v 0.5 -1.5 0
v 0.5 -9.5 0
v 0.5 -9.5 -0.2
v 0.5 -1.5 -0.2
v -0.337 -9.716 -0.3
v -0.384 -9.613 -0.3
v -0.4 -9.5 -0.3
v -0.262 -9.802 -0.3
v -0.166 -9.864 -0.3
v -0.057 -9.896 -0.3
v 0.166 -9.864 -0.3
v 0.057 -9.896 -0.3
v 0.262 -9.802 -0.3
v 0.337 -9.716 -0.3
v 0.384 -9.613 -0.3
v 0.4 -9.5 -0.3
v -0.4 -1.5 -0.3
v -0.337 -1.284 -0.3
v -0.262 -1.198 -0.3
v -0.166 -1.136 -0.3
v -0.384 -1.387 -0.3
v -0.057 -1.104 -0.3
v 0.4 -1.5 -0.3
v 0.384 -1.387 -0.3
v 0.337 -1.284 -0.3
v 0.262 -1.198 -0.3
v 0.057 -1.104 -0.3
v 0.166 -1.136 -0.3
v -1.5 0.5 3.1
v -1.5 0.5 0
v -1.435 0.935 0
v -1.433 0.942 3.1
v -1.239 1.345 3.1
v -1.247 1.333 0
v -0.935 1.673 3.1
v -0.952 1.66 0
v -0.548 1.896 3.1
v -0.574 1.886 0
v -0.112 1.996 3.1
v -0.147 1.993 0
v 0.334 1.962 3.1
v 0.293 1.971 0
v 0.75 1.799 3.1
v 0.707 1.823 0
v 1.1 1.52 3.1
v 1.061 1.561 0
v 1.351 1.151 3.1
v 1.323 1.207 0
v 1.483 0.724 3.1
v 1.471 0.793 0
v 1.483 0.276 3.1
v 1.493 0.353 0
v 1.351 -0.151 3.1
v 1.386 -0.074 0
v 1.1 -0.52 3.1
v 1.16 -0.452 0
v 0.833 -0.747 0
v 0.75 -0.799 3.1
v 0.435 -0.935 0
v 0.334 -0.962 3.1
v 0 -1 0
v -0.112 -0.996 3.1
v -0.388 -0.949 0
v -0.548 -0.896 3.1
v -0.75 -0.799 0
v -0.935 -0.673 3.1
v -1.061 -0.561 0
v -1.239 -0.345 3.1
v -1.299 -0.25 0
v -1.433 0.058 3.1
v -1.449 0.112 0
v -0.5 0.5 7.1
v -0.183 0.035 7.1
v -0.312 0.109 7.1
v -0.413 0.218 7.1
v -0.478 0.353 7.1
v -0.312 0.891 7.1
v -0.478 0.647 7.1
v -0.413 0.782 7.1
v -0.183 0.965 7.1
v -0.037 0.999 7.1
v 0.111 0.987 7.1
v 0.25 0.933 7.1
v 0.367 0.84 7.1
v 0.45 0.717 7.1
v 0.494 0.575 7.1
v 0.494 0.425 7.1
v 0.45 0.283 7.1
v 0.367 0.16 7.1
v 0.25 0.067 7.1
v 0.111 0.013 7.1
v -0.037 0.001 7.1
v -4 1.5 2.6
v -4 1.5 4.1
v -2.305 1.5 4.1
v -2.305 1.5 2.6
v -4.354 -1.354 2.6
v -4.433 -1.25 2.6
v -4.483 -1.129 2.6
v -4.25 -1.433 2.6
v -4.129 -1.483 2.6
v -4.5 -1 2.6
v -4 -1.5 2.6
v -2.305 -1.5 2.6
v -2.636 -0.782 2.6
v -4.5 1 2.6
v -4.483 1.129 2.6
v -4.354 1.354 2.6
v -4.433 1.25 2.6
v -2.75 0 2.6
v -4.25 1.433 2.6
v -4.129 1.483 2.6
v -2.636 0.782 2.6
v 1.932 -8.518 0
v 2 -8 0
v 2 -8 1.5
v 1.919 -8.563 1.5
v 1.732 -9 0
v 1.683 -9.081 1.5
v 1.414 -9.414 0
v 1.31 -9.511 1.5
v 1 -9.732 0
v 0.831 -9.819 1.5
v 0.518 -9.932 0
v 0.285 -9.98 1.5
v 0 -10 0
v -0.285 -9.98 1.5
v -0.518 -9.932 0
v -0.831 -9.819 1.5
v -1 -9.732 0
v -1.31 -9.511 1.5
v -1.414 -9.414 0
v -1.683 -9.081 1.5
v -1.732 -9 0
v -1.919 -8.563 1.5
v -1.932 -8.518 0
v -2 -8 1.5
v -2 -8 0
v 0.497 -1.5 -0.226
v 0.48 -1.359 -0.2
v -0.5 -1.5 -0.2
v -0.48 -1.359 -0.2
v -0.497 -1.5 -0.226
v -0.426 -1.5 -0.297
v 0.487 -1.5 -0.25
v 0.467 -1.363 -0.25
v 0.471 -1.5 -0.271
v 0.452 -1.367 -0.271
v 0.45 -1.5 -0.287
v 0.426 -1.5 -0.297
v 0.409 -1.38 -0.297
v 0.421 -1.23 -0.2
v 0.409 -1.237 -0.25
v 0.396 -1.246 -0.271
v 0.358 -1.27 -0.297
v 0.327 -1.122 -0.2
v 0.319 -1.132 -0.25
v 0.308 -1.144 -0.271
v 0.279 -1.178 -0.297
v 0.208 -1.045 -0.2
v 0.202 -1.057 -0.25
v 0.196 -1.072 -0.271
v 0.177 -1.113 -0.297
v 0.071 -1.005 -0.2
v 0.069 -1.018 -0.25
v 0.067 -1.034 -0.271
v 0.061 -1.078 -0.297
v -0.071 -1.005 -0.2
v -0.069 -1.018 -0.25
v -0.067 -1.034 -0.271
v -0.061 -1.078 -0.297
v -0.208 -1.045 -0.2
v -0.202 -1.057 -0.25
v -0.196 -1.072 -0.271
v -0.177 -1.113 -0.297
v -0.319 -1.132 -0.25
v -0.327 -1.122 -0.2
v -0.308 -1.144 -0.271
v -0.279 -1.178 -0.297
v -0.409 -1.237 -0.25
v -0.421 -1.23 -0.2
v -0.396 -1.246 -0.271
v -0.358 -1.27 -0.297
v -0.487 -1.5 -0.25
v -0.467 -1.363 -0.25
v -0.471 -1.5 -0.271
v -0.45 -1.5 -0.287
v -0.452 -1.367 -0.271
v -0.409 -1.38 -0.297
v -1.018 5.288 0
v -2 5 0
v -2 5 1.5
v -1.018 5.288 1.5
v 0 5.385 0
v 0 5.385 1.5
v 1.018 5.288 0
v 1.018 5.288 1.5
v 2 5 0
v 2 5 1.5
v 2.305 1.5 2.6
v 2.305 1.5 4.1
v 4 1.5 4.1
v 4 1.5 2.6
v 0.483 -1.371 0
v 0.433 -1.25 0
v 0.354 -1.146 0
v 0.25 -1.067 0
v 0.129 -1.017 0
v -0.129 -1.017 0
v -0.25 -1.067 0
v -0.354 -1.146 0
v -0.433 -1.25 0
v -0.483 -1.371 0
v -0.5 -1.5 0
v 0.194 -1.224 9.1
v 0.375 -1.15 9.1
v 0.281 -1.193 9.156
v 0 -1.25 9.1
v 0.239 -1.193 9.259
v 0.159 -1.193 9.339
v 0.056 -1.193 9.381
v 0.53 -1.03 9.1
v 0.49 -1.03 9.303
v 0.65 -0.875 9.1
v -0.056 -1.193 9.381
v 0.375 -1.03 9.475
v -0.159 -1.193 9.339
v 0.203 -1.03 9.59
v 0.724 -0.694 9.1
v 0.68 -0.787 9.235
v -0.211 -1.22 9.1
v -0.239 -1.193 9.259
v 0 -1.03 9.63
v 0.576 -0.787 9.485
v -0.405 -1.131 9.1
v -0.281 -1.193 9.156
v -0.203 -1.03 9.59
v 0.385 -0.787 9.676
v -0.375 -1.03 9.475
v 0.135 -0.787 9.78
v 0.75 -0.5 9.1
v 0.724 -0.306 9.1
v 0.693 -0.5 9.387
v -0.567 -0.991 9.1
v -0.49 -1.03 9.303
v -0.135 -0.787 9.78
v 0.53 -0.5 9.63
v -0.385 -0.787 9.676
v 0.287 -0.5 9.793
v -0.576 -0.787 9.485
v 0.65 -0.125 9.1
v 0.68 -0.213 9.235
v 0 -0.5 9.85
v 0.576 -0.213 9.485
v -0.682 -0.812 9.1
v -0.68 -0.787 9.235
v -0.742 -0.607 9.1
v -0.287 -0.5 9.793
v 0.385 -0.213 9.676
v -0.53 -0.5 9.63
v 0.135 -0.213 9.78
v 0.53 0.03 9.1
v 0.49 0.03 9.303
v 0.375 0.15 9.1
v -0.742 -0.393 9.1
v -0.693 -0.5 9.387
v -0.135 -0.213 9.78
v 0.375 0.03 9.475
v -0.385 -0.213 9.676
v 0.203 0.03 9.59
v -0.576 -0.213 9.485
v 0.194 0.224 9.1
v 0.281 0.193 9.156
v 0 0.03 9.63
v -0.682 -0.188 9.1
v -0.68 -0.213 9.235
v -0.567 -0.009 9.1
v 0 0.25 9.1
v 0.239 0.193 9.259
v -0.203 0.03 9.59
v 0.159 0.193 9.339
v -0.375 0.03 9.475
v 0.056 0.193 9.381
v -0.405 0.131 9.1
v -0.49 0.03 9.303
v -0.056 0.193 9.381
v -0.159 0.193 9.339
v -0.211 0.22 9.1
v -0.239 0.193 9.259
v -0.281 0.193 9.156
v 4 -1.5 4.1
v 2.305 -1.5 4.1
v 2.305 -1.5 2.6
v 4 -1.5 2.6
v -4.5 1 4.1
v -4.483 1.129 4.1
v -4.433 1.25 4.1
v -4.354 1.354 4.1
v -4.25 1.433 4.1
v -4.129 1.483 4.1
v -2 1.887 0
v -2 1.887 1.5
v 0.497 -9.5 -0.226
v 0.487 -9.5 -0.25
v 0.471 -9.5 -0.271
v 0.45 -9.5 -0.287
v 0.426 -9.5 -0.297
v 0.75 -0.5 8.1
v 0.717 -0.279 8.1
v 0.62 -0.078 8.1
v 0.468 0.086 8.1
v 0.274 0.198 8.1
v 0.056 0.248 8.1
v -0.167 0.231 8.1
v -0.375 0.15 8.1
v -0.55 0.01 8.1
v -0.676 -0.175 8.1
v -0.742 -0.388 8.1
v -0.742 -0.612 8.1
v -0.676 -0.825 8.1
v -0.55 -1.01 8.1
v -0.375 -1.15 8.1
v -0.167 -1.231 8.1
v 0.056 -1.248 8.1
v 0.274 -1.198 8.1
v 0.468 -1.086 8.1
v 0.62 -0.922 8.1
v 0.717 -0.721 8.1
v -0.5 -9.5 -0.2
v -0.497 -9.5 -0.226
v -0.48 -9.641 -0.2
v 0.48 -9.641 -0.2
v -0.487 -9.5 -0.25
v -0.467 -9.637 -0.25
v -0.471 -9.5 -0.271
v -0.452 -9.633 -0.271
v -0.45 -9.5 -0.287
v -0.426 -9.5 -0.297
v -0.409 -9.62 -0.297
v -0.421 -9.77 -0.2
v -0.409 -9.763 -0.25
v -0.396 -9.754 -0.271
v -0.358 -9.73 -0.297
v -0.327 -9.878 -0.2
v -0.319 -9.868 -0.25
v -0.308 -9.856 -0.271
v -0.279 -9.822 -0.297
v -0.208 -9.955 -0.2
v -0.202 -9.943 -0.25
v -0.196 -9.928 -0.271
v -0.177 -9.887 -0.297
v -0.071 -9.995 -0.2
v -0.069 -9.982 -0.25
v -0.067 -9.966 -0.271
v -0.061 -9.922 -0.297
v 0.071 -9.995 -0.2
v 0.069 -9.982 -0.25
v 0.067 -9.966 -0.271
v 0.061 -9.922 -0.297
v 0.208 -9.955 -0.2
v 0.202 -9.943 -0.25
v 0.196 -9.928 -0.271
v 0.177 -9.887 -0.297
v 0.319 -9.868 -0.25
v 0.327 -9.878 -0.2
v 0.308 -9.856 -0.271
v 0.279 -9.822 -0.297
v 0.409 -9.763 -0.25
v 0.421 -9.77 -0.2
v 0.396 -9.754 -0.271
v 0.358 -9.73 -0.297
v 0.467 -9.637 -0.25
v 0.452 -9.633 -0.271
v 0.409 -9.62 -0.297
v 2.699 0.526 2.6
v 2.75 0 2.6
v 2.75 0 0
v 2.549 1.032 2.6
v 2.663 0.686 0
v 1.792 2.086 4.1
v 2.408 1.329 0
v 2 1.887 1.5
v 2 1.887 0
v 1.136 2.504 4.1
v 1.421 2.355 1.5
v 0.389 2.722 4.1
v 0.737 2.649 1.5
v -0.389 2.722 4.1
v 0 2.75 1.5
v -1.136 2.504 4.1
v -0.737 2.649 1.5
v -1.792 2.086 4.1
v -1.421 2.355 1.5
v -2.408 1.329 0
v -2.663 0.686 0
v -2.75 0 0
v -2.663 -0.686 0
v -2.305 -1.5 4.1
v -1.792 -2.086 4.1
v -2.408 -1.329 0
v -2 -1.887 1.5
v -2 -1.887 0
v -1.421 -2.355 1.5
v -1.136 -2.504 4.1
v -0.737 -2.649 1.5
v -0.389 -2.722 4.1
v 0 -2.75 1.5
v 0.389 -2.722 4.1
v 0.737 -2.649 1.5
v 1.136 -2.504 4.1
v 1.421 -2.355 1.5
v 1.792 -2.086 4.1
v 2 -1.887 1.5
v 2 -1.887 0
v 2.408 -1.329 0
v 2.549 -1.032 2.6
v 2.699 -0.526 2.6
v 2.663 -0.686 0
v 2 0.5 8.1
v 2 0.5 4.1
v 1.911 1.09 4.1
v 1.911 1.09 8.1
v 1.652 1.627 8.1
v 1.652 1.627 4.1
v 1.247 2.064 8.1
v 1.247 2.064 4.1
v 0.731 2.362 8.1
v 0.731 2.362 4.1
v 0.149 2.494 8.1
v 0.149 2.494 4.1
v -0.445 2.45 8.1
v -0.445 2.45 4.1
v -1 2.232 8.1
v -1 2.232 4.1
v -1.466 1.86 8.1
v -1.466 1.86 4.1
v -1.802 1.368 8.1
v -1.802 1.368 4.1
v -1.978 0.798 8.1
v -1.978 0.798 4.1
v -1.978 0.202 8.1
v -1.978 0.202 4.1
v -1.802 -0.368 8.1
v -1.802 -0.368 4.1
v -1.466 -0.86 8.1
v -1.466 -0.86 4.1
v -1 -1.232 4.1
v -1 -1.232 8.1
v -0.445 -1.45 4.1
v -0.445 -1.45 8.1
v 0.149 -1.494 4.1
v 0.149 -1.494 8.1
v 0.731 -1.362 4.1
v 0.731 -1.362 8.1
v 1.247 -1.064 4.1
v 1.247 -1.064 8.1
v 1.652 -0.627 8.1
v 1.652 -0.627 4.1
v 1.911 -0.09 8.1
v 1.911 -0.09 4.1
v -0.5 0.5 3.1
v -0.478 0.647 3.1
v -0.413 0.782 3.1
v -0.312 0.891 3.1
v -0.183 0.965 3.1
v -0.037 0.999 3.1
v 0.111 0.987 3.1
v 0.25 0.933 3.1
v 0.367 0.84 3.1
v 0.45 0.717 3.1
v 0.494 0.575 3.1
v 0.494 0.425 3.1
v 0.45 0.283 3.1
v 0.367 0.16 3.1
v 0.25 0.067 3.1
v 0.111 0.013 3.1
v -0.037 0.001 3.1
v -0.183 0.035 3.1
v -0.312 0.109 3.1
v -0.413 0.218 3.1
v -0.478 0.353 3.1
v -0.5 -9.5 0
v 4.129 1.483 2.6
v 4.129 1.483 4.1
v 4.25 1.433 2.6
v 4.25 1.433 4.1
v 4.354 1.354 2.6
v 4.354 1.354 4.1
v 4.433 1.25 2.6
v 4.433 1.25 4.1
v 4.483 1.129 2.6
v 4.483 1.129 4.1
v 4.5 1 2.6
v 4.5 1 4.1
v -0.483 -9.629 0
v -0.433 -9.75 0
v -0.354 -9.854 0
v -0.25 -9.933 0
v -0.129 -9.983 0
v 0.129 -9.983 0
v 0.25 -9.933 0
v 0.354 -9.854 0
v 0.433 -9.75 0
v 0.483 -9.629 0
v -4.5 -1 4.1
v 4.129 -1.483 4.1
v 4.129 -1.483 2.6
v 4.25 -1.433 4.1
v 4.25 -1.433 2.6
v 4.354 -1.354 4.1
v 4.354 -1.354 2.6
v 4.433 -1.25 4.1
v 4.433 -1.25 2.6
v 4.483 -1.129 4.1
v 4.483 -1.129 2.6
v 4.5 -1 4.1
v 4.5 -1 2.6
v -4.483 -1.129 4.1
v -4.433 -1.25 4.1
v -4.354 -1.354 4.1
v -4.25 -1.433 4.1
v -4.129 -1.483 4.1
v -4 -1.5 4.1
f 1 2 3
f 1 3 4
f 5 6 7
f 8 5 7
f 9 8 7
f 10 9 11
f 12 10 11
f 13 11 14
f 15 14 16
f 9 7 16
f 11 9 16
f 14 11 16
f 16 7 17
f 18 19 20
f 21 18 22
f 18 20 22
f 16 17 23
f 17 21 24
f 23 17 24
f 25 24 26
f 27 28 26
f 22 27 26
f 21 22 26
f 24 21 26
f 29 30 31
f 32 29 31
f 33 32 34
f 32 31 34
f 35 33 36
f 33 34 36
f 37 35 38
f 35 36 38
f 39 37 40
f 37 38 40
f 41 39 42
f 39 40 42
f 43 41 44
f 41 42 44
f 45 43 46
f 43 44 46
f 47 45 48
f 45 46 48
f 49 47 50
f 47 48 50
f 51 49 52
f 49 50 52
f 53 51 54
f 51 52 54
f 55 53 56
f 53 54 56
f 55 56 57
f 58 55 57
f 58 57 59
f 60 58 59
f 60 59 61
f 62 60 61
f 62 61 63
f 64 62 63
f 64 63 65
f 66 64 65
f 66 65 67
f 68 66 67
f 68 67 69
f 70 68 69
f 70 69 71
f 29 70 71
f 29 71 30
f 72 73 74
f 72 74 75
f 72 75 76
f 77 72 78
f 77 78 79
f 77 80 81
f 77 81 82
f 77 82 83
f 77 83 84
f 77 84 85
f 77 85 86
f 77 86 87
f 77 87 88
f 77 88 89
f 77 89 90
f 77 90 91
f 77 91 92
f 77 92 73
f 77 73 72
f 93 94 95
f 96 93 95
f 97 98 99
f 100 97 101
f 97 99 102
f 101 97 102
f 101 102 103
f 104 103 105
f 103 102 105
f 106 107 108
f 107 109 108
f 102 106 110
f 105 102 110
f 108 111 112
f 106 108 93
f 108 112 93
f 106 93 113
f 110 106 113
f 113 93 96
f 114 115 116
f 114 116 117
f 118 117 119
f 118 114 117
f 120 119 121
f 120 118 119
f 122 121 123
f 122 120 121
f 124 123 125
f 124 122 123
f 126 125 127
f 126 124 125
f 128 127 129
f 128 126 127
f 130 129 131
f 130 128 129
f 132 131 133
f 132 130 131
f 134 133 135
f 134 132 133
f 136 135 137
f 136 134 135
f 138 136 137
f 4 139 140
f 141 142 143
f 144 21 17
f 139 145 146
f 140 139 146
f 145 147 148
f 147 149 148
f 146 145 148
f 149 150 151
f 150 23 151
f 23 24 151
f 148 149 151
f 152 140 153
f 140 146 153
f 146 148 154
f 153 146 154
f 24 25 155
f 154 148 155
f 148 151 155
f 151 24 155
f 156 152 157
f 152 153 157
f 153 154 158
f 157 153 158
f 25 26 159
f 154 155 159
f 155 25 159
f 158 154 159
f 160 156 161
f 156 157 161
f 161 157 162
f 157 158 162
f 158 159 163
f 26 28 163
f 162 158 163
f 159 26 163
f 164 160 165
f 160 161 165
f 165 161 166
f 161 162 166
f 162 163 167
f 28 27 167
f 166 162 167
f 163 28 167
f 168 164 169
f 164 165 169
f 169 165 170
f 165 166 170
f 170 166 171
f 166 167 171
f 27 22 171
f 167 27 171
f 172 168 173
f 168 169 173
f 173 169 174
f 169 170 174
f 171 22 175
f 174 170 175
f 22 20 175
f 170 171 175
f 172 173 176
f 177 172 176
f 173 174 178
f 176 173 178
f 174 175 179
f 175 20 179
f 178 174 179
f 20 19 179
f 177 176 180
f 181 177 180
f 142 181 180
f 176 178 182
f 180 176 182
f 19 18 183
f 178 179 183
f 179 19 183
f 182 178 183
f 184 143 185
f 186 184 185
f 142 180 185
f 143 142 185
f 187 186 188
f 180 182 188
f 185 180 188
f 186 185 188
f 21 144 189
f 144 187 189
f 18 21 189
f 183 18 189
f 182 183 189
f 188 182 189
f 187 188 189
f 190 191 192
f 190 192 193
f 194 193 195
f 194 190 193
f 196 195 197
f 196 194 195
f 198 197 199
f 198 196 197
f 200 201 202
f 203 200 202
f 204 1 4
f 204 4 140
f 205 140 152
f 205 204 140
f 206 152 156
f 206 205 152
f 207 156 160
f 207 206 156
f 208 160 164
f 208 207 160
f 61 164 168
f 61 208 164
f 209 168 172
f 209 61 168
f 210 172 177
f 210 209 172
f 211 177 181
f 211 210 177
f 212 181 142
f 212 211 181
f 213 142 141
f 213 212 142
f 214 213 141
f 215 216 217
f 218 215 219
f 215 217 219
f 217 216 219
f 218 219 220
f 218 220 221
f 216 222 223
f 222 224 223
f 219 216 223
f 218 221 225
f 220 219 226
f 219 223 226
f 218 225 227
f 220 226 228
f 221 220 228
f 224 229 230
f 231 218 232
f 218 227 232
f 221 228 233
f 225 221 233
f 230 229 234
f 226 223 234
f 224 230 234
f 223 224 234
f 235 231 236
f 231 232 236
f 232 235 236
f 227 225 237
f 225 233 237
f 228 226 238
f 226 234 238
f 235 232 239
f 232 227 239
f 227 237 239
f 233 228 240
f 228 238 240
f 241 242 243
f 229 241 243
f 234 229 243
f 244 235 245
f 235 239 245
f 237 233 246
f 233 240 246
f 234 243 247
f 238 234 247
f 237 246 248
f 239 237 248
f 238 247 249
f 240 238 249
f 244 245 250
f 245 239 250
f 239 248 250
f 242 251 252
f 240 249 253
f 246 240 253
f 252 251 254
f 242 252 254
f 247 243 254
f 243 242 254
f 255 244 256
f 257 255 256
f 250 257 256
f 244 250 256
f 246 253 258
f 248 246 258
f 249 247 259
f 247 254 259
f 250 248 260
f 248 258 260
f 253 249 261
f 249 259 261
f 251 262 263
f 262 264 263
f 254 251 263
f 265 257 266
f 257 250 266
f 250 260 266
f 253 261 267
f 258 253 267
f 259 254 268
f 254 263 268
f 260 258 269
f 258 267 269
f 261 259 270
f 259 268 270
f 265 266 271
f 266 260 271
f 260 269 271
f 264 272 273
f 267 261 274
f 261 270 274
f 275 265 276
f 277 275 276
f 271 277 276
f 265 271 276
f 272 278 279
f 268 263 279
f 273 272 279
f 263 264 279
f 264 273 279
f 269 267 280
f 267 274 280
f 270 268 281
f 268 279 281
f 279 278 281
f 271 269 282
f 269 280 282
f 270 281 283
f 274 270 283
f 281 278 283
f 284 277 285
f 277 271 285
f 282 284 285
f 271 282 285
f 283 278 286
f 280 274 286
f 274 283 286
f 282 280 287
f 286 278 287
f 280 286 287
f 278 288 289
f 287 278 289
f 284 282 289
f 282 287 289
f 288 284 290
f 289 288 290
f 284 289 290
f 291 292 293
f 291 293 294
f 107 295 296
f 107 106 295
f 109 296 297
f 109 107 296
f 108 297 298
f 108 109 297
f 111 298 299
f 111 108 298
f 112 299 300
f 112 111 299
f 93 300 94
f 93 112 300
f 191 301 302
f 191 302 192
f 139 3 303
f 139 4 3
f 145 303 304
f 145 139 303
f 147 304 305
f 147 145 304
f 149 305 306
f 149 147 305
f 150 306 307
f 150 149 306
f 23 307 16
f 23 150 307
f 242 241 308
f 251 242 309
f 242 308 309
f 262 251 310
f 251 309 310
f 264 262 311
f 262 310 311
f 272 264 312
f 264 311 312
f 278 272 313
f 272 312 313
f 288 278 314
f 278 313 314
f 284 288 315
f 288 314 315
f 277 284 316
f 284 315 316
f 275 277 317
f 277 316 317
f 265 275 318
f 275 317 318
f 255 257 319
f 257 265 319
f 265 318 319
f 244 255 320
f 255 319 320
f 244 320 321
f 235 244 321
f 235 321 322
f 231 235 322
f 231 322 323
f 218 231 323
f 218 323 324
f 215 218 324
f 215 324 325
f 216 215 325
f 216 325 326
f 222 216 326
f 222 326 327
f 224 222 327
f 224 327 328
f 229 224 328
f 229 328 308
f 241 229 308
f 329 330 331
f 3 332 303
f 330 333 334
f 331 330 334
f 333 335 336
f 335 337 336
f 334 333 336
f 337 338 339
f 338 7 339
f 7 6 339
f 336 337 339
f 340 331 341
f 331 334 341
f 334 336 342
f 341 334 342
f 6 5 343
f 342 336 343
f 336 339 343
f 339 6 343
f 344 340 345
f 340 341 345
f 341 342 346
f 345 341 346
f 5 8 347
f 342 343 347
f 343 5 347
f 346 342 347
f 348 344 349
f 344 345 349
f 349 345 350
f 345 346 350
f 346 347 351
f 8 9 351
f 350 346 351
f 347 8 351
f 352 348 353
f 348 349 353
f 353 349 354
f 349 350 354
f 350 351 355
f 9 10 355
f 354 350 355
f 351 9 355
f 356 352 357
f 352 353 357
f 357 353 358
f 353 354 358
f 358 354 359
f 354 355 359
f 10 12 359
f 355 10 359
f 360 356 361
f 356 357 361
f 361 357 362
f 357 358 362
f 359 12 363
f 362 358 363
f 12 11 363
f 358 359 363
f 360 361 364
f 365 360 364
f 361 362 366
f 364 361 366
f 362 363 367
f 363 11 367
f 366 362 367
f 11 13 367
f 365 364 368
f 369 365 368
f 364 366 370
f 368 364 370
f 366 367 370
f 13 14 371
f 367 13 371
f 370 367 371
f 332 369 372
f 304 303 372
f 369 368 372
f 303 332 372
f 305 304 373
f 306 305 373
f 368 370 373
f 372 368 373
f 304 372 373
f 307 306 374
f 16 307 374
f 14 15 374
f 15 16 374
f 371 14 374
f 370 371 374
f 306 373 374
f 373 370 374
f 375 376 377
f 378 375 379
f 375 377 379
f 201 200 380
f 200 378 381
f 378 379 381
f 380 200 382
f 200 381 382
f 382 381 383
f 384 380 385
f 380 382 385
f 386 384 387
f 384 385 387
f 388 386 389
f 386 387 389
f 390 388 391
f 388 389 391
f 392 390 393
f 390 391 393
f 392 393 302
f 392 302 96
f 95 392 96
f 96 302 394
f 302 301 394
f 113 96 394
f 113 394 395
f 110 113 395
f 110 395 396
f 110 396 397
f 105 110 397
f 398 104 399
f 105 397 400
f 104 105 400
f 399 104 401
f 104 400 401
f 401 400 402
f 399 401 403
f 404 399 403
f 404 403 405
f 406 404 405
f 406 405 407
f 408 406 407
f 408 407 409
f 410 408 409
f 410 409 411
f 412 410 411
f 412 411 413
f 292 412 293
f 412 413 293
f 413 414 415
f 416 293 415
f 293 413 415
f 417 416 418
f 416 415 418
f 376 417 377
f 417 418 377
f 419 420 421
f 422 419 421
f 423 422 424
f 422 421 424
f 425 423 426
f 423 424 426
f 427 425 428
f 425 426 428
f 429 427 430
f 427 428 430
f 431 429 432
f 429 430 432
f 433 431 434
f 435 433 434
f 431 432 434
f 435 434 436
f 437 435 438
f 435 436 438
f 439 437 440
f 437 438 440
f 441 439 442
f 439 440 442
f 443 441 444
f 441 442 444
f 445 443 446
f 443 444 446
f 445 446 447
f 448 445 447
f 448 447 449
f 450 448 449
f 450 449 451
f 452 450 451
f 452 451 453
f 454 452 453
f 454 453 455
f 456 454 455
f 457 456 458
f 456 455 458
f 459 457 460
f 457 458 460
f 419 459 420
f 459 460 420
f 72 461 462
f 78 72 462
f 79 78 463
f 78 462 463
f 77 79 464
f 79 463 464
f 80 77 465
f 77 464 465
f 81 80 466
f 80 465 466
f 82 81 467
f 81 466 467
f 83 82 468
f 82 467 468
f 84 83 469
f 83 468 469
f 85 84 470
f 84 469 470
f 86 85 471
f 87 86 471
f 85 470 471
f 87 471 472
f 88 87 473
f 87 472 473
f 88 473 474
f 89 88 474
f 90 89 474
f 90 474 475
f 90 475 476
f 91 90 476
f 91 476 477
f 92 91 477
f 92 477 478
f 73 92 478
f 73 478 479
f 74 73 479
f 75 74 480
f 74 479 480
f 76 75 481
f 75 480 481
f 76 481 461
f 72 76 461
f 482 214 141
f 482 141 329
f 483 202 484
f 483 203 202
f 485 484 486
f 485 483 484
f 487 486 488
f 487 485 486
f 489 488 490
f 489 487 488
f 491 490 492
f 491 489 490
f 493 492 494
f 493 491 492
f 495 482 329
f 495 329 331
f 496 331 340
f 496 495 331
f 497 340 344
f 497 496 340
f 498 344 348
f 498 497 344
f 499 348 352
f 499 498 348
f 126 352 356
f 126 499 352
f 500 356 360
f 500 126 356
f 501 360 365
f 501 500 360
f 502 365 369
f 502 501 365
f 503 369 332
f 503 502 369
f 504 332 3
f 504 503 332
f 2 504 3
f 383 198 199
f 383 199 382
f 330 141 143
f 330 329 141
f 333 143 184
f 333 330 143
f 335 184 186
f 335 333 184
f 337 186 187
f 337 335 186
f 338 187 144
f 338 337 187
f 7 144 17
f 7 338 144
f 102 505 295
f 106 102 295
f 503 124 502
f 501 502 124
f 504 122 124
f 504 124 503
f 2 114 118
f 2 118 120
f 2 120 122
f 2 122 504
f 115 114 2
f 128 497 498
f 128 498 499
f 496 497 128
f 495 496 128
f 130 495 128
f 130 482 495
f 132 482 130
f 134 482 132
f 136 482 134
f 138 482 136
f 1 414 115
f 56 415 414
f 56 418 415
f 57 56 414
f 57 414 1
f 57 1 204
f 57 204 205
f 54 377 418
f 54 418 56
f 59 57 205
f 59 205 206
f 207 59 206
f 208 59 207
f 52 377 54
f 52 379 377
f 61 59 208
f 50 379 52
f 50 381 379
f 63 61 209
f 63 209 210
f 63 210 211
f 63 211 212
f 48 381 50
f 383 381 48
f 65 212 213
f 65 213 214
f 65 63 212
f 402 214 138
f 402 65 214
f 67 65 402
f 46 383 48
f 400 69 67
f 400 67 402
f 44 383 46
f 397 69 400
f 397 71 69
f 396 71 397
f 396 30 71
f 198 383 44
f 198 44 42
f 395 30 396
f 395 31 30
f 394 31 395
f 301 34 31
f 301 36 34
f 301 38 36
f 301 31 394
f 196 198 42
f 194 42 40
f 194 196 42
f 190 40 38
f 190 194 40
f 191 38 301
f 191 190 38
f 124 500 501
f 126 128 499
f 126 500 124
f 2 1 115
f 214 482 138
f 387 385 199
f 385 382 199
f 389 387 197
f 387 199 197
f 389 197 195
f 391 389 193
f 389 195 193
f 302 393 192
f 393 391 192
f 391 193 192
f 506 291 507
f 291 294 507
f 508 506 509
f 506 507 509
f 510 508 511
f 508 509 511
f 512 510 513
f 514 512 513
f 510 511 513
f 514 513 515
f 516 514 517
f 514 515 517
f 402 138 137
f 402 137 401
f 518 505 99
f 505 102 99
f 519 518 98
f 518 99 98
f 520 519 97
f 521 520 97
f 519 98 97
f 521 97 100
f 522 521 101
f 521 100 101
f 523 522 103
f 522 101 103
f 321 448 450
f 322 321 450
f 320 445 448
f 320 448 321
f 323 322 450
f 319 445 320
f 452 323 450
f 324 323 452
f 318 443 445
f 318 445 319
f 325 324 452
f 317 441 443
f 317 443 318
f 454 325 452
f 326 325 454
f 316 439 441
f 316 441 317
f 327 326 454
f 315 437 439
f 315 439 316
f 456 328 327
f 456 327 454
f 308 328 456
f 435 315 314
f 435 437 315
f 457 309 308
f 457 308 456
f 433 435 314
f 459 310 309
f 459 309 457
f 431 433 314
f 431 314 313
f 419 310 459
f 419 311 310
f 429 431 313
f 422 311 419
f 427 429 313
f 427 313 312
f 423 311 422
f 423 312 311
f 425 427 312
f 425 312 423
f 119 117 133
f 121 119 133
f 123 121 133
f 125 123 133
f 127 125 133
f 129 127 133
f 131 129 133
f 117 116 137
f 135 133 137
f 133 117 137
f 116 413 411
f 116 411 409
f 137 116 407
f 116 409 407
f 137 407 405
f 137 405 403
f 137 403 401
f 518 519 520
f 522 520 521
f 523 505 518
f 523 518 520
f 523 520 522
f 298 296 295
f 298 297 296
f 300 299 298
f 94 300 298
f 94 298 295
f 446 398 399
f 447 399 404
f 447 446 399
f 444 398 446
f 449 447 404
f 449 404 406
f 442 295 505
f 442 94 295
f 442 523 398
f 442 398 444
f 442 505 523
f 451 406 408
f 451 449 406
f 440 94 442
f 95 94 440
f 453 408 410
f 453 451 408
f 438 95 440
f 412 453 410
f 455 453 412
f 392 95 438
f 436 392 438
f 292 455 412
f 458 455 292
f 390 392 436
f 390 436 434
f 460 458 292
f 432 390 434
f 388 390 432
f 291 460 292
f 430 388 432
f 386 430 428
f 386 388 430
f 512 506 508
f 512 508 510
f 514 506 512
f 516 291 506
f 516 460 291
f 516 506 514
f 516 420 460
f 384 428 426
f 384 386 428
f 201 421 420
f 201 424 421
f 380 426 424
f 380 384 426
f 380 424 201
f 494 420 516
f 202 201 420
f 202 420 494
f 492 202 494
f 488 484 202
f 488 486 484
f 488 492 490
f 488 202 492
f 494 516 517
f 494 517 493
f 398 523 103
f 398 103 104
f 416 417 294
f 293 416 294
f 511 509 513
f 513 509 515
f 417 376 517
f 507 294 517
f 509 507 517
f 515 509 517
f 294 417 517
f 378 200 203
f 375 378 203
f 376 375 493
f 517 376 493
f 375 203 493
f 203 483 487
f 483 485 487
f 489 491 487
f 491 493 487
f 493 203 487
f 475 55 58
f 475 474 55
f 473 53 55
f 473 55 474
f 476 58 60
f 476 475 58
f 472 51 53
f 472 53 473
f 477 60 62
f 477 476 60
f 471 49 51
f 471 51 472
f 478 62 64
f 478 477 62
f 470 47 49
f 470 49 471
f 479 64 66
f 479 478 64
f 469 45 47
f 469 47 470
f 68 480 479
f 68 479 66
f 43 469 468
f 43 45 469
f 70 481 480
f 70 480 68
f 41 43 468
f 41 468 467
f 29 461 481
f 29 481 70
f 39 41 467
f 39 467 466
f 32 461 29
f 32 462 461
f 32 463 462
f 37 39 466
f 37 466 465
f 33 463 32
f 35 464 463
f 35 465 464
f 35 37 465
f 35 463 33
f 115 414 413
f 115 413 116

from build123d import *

# Parameters (mm, degrees)
SCHIZZO1_R                   = 2.75
ESTRUSIONE_ESTRUSIONE1_DEPTH = 4.1
SCHIZZO2_W                   = 9
SCHIZZO2_H                   = 3
ESTRUSIONE_ESTRUSIONE2_DEPTH = 1.5
RACCORDO1_R                  = 0.5
SCHIZZO3_R                   = 2
ESTRUSIONE_ESTRUSIONE3_DEPTH = 4
SCHIZZO4_R                   = 0.75
ESTRUSIONE_ESTRUSIONE4_DEPTH = 1
RIVOLUZIONE1_ANGLE           = 180
ESTRUSIONE_ESTRUSIONE5_DEPTH = 1.5
SCHIZZO7_R                   = 1.5
TAGLIO_ESTRUSIONE2_DEPTH     = 3.1
SCHIZZO8_R                   = 0.5
TAGLIO_ESTRUSIONE5_DEPTH     = 4
ESTRUSIONE_ESTRUSIONE6_DEPTH = 0.3
RACCORDO5_R                  = 0.1


with BuildPart() as part:
    # Schizzo1 → Estrusione-Estrusione1 (new body)
    with BuildSketch(Plane.XY):
        Circle(SCHIZZO1_R)
    extrude(amount=ESTRUSIONE_ESTRUSIONE1_DEPTH)

    # Schizzo2 → Estrusione-Estrusione2 (add)
    with BuildSketch(Plane.XY.offset(4.1)):
        Rectangle(SCHIZZO2_W, SCHIZZO2_H)
    extrude(amount=-ESTRUSIONE_ESTRUSIONE2_DEPTH)

    # Raccordo1
    raccordo1_edges = [part.edges().sort_by_distance(p)[0] for p in [
        (4.5, -1.5, 3.35),
        (-4.5, 1.5, 3.35),
        (4.5, 1.5, 3.35),
        (-4.5, -1.5, 3.35),
    ]]
    fillet(raccordo1_edges, radius=RACCORDO1_R)

    # Schizzo3 → Estrusione-Estrusione3 (add)
    with BuildSketch(Plane.XY.offset(4.1)):
        with Locations((0, 0.5)):
            Circle(SCHIZZO3_R)
    extrude(amount=ESTRUSIONE_ESTRUSIONE3_DEPTH)

    # Schizzo4 → Estrusione-Estrusione4 (add)
    with BuildSketch(Plane.XY.offset(8.1)):
        with Locations((0, -0.5)):
            Circle(SCHIZZO4_R)
    extrude(amount=ESTRUSIONE_ESTRUSIONE4_DEPTH)

    # Schizzo5 → Rivoluzione1 (revolve)
    with BuildSketch(Plane.XY.offset(9.1)):
        with BuildLine():
            Line((0, 0.25), (0, -1.25))
            ThreePointArc((0, -1.25), (0.75, -0.5), (0, 0.25))
        make_face()
    revolve(axis=Axis((0, 0.25, 9.1), (0, -1, 0)), revolution_arc=RIVOLUZIONE1_ANGLE)

    # Schizzo6 → Estrusione-Estrusione5 (add)
    with BuildSketch(Plane.XY):
        with BuildLine():
            Line((-2, -8), (-2, 5))
            ThreePointArc((-2, 5), (0, 5.385164807), (2, 5))
            Line((2, 5), (2, -8))
            ThreePointArc((2, -8), (0, -10), (-2, -8))
        make_face()
    extrude(amount=ESTRUSIONE_ESTRUSIONE5_DEPTH)

    # Schizzo7 → Taglio-Estrusione2 (cut)
    with BuildSketch(Plane(origin=(0, 0, 0), x_dir=(-1, 0, 0), z_dir=(0, 0, -1))):
        with Locations((0, 0.5)):
            Circle(SCHIZZO7_R)
    extrude(amount=-TAGLIO_ESTRUSIONE2_DEPTH, mode=Mode.SUBTRACT)

    # Schizzo8 → Taglio-Estrusione5 (cut)
    with BuildSketch(Plane(origin=(0, 0, 3.1), x_dir=(-1, 0, 0), z_dir=(0, 0, -1))):
        with Locations((0, 0.5)):
            Circle(SCHIZZO8_R)
    extrude(amount=-TAGLIO_ESTRUSIONE5_DEPTH, mode=Mode.SUBTRACT)

    # Schizzo9 → Estrusione-Estrusione6 (add)
    with BuildSketch(Plane(origin=(0, 0, 0), x_dir=(-1, 0, 0), z_dir=(0, 0, -1))):
        with BuildLine():
            Line((-0.5, -9.5), (-0.5, -1.5))
            ThreePointArc((-0.5, -1.5), (0, -1), (0.5, -1.5))
            Line((0.5, -1.5), (0.5, -9.5))
            ThreePointArc((0.5, -9.5), (0, -10), (-0.5, -9.5))
        make_face()
    extrude(amount=ESTRUSIONE_ESTRUSIONE6_DEPTH)

    # Raccordo5
    raccordo5_edges = [part.edges().sort_by_distance(p)[0] for p in [
        (0, -10, -0.3),
        (-0.5, -5.5, -0.3),
        (0, -1, -0.3),
        (0.5, -5.5, -0.3),
    ]]
    fillet(raccordo5_edges, radius=RACCORDO5_R)


solid = part.part
